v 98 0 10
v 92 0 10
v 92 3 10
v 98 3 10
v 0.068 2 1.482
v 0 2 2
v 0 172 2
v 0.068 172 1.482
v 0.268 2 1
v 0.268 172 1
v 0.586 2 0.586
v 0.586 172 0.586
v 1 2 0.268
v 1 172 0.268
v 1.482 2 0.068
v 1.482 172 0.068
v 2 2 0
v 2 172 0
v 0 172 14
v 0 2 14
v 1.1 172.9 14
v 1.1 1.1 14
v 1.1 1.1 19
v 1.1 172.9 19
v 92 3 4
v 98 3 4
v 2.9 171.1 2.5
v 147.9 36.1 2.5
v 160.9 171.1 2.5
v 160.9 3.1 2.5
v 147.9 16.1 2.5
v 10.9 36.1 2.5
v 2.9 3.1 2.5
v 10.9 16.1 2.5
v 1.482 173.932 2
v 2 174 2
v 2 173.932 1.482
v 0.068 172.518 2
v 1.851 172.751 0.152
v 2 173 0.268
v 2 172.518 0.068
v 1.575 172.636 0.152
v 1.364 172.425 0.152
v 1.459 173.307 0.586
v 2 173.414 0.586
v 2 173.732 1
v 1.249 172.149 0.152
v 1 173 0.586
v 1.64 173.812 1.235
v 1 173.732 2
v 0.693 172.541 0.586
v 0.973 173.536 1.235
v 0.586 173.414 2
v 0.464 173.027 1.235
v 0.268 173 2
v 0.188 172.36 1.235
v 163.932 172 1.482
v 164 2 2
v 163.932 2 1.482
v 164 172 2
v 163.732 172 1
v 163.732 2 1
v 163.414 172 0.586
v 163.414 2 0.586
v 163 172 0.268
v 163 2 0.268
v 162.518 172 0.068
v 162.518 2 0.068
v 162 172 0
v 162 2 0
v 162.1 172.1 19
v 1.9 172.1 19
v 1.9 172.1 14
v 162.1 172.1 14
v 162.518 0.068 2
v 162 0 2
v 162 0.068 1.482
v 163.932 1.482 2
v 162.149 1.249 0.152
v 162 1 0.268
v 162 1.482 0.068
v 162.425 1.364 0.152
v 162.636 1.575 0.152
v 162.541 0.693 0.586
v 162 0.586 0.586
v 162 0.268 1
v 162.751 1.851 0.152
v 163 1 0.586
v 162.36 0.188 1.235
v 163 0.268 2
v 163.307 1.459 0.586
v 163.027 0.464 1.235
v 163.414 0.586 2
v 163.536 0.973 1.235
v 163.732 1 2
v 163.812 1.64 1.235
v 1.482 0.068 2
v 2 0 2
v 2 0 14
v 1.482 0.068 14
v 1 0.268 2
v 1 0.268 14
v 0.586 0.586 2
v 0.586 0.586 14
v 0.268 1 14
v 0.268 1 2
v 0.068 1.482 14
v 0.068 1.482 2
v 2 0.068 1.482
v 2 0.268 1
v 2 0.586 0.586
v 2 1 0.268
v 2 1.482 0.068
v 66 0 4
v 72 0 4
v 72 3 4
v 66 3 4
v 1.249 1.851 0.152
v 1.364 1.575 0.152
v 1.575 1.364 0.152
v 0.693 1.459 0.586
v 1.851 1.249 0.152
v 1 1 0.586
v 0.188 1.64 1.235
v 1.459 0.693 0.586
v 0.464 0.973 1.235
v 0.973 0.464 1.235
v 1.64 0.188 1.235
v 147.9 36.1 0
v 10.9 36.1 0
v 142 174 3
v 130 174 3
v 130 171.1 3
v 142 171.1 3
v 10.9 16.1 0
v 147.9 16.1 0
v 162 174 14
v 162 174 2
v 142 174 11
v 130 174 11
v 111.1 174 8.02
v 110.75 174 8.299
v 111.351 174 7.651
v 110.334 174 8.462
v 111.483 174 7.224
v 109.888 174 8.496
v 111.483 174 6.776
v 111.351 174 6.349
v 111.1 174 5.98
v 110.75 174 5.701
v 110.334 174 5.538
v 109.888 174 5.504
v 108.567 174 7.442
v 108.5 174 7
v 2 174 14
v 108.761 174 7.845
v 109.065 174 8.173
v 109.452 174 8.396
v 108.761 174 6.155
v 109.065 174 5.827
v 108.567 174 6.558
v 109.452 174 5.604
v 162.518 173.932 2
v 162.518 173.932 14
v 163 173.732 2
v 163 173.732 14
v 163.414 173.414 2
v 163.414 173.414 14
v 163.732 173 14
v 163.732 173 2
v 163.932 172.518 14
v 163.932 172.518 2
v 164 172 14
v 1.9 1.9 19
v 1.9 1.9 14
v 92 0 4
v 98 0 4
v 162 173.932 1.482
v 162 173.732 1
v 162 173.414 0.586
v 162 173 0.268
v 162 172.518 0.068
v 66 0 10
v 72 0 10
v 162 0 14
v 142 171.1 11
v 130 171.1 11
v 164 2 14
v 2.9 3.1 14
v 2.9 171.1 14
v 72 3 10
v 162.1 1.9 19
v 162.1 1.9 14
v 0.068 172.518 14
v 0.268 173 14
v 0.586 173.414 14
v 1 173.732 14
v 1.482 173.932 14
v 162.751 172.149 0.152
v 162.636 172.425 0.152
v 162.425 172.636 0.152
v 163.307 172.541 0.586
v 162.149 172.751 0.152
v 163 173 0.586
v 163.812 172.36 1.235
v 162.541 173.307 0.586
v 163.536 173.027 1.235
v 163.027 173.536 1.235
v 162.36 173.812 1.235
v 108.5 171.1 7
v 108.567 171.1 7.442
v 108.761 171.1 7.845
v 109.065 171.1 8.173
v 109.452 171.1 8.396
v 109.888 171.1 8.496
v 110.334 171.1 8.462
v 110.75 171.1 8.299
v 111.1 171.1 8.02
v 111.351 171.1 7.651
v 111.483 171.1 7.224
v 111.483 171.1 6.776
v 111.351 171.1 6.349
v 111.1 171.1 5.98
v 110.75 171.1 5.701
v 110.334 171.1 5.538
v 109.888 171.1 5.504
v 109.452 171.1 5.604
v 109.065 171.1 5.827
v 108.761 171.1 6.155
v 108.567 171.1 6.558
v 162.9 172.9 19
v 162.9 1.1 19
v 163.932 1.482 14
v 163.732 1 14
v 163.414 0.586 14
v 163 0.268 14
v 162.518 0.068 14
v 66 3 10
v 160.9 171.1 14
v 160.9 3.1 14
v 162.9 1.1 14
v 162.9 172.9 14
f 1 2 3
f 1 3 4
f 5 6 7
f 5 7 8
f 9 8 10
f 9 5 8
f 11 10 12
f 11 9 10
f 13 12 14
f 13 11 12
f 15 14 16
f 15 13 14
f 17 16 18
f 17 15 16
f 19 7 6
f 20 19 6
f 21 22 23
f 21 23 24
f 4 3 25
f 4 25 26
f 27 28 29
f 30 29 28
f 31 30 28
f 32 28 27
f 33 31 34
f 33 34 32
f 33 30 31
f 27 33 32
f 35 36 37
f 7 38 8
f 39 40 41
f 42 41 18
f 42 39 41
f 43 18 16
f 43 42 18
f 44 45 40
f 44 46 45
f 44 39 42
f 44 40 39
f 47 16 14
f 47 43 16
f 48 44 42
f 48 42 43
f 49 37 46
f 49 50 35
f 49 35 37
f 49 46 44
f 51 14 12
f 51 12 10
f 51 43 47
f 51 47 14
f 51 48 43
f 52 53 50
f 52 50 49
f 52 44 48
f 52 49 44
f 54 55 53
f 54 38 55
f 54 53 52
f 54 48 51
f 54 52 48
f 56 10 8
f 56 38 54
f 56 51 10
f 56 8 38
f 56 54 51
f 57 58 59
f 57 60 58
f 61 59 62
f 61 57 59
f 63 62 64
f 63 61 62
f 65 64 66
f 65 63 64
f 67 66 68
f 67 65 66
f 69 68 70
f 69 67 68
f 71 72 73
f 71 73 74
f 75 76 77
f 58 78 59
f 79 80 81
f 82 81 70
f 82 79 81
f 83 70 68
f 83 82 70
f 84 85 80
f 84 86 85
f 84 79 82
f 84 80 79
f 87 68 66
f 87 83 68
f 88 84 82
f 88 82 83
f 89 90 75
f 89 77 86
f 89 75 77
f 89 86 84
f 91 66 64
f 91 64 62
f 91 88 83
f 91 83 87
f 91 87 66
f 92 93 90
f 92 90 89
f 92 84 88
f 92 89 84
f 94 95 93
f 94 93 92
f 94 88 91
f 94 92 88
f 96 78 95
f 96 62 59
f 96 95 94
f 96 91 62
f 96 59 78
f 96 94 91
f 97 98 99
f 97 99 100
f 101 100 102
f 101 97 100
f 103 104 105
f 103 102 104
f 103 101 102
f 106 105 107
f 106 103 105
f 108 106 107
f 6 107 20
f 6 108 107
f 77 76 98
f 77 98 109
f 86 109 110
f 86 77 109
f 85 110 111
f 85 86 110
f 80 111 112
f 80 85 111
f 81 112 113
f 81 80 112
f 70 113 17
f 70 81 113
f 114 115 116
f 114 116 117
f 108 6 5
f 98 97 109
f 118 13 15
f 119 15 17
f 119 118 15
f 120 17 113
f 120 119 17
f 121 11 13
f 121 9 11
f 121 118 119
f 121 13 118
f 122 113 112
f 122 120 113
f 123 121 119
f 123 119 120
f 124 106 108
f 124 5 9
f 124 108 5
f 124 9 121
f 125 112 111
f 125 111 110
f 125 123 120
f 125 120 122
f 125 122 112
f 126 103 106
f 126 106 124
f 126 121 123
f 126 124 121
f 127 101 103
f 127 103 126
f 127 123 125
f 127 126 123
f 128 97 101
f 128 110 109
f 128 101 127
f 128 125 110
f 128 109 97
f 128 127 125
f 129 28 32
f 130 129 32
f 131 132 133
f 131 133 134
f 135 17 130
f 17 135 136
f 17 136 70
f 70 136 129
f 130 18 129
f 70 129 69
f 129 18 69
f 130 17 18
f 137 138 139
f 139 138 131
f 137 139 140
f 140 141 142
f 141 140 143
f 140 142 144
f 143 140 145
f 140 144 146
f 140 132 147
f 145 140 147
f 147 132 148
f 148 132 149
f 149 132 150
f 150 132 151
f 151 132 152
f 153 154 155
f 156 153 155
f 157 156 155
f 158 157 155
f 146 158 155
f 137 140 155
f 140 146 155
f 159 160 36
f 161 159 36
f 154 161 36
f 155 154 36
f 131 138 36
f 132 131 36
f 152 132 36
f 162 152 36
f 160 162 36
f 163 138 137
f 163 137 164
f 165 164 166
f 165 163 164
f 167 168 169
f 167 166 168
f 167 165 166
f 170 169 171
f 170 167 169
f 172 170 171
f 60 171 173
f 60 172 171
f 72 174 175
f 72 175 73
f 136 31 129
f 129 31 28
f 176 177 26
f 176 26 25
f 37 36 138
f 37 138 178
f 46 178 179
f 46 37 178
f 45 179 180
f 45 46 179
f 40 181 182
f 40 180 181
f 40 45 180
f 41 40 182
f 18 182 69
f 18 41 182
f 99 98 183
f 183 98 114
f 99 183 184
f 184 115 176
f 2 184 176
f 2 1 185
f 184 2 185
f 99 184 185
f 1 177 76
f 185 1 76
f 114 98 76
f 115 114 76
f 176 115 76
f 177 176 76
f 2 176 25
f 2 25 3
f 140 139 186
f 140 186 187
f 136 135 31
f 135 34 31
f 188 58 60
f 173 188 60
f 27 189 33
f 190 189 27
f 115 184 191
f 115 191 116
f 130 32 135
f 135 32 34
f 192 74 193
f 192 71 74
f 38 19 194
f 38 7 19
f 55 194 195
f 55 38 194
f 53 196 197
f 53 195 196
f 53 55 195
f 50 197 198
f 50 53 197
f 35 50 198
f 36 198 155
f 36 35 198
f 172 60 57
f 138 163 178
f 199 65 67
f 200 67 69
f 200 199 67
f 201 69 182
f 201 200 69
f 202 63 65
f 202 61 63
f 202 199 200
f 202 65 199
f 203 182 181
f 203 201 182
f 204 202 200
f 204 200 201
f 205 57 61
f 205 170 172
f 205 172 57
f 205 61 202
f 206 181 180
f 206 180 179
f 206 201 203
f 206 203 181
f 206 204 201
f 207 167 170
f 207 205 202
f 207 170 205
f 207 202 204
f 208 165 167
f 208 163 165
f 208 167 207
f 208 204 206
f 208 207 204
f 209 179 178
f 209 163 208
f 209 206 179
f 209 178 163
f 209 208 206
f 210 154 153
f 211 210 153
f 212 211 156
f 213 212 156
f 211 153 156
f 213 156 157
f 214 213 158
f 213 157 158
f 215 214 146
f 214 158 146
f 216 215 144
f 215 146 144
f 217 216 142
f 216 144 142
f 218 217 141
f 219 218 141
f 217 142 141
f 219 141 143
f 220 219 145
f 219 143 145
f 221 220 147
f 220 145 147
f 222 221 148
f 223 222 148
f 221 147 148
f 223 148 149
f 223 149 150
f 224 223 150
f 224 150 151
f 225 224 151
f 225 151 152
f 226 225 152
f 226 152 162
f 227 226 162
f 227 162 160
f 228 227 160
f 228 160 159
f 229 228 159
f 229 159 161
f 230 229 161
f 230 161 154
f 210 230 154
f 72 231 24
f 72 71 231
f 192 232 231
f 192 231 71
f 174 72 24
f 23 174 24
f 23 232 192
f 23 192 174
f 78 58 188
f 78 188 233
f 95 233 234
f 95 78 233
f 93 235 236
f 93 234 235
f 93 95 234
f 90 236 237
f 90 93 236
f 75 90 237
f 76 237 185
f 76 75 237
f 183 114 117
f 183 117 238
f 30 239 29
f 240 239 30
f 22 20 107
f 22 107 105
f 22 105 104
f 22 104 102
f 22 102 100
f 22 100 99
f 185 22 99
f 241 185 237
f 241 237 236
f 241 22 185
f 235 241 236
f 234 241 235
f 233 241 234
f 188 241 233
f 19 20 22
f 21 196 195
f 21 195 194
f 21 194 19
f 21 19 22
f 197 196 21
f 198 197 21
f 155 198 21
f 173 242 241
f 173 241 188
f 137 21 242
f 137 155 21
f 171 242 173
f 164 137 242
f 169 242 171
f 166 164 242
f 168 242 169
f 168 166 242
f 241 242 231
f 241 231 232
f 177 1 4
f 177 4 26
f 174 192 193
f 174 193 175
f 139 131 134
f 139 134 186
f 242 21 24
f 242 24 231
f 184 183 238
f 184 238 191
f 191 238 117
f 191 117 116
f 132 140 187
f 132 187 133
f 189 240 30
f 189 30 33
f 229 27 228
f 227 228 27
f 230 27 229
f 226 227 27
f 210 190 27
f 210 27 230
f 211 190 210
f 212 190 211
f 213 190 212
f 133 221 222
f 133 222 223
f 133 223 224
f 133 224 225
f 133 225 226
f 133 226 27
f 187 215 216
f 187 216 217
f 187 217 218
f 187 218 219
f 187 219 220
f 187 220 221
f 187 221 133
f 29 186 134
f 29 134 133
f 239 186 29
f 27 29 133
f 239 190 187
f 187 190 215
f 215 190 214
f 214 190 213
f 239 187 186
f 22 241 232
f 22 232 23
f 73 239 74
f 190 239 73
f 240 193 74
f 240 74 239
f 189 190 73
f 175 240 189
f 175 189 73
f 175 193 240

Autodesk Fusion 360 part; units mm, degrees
sketch "Sketch1" plane through (0, 0, 0) normal (0, 0, 1) x (1, 0, 0)
  line L0 (2, 0) -> (162, 0)
  line L1 (164, 2) -> (164, 172)
  line L2 (162, 174) -> (2, 174)
  line L3 (0, 172) -> (0, 2)
  arc A0 (2, 174) -> (0, 172) centre (2, 172) ccw
  arc A1 (164, 172) -> (162, 174) centre (162, 172) ccw
  arc A2 (0, 2) -> (2, 0) centre (2, 2) ccw
  arc A3 (162, 0) -> (164, 2) centre (162, 2) ccw
  point P0 (164, 0)
  point P1 (0, 174)
  dimension "d1" = 164
  dimension "d2" = 174
  dimension "d3" = 2
  dimension "d4" = 2
  dimension "d5" = 2
  dimension "d6" = 2
extrude "Extrude1" add sketch "Sketch1" along normal blind 14
sketch "Sketch4" plane through (0, 0, 14) normal (0, 0, 1) x (-1, 0, 0)
  arc A0 (-162, 0) -> (-164, -2) centre (-162, -2) ccw
  line L0 (-164, -2) -> (-164, -172)
  arc A1 (-164, -172) -> (-162, -174) centre (-162, -172) ccw
  line L1 (-162, -174) -> (-2, -174)
  arc A2 (-2, -174) -> (0, -172) centre (-2, -172) ccw
  line L2 (0, -172) -> (0, -2)
  arc A3 (0, -2) -> (-2, 0) centre (-2, -2) ccw
  line L3 (-2, 0) -> (-162, 0)
  line L4 (-1.1, -172.9) -> (-162.9, -172.9)
  line L5 (-162.9, -172.9) -> (-162.9, -1.1)
  line L6 (-162.9, -1.1) -> (-1.1, -1.1)
  line L7 (-1.1, -1.1) -> (-1.1, -172.9)
  dimension "d19" = 161.8
  dimension "d20" = 171.8
  dimension "d21" = 1.1
  dimension "d22" = 1.1
extrude "Extrude4" add sketch "Sketch4" along normal blind 5 contours L4 L5 L6 L7
sketch "Sketch5" plane through (0, 0, 19) normal (0, 0, 1) x (-1, 0, 0)
  line L0 (-1.1, -1.1) -> (-162.9, -1.1)
  line L1 (-162.9, -1.1) -> (-162.9, -172.9)
  line L2 (-162.9, -172.9) -> (-1.1, -172.9)
  line L3 (-1.1, -172.9) -> (-1.1, -1.1)
  line L4 (-1.9, -172.1) -> (-162.1, -172.1)
  line L5 (-162.1, -172.1) -> (-162.1, -1.9)
  line L6 (-162.1, -1.9) -> (-1.9, -1.9)
  line L7 (-1.9, -1.9) -> (-1.9, -172.1)
  dimension "d25" = 160.2
  dimension "d26" = 170.2
  dimension "d27" = 0.8
  dimension "d28" = 0.8
extrude "Extrude5" cut sketch "Sketch5" against normal blind 5 contours L4 L5 L6 L7
sketch "Sketch6" plane through (0, 0, 14) normal (0, 0, 1) x (-1, 0, 0)
  line L0 (-1.9, -1.9) -> (-162.1, -1.9)
  line L1 (-162.1, -1.9) -> (-162.1, -172.1)
  line L2 (-162.1, -172.1) -> (-1.9, -172.1)
  line L3 (-1.9, -172.1) -> (-1.9, -1.9)
  line L4 (-2.9, -171.1) -> (-160.9, -171.1)
  line L5 (-160.9, -171.1) -> (-160.9, -3.1)
  line L6 (-160.9, -3.1) -> (-2.9, -3.1)
  line L7 (-2.9, -3.1) -> (-2.9, -171.1)
  dimension "d31" = 158
  dimension "d32" = 168
  dimension "d33" = 1
  dimension "d34" = 1
extrude "Extrude6" cut sketch "Sketch6" against normal blind 11.5 contours L4 L5 L6 L7
sketch "Sketch9" plane through (0, 0, 2.5) normal (0, 0, 1) x (-1, 0, 0)
  line L0 (-2.9, -3.1) -> (-160.9, -3.1)
  line L1 (-160.9, -3.1) -> (-160.9, -171.1)
  line L2 (-160.9, -171.1) -> (-2.9, -171.1)
  line L3 (-2.9, -171.1) -> (-2.9, -3.1)
  line L4 (-10.9, -16.1) -> (-147.9, -16.1)
  line L5 (-147.9, -16.1) -> (-147.9, -36.1)
  line L6 (-147.9, -36.1) -> (-10.9, -36.1)
  line L7 (-10.9, -36.1) -> (-10.9, -16.1)
  dimension "d37" = 137
  dimension "d38" = 20
  dimension "d39" = 13
  dimension "d40" = 8
extrude "Extrude7" cut sketch "Sketch9" against normal blind 2.5 contours L4 L5 L6 L7
sketch "Sketch10" plane through (0, 0, 0) normal (0, -1, 0) x (1, 0, 0)
  line L0 (2, 0) -> (162, 0)
  line L1 (162, 0) -> (162, 14)
  line L2 (162, 14) -> (2, 14)
  line L3 (2, 14) -> (2, 0)
  line L4 (66, 10) -> (72, 10)
  line L5 (72, 10) -> (72, 4)
  line L6 (72, 4) -> (66, 4)
  line L7 (66, 4) -> (66, 10)
  dimension "d43" = 6
  dimension "d44" = 6
  dimension "d45" = 4
  dimension "d46" = 64
sketch "Sketch11" plane through (0, 0, 0) normal (0, -1, 0) x (1, 0, 0)
  line L0 (92, 10) -> (98, 10)
  line L1 (98, 10) -> (98, 4)
  line L2 (98, 4) -> (92, 4)
  line L3 (92, 4) -> (92, 10)
  line L4 (162, 14) -> (2, 14)
  line L5 (162, 0) -> (162, 14)
  dimension "d47" = 6
  dimension "d48" = 6
  dimension "d49" = 4
  dimension "d50" = 64
extrude "Extrude8" cut sketch "Sketch10" against normal blind 3 contours L4 L5 L6 L7
extrude "Extrude9" cut sketch "Sketch11" against normal blind 3
sketch "Sketch12" plane through (0, 174, 0) normal (0, 1, 0) x (-1, 0, 0)
  line L0 (-162, 0) -> (-2, 0)
  line L1 (-2, 0) -> (-2, 14)
  line L2 (-2, 14) -> (-162, 14)
  line L3 (-162, 14) -> (-162, 0)
  line L4 (-142, 11) -> (-130, 11)
  line L5 (-130, 11) -> (-130, 3)
  line L6 (-130, 3) -> (-142, 3)
  line L7 (-142, 3) -> (-142, 11)
  dimension "d55" = 12
  dimension "d56" = 8
  dimension "d57" = 20
  dimension "d58" = 3
sketch "Sketch13" plane through (0, 174, 0) normal (0, 1, 0) x (-1, 0, 0)
  circle A0 centre (-110, 7) radius 1.5
  line L0 (-130, 11) -> (-130, 3)
  line L1 (-2, 14) -> (-162, 14)
  dimension "d59" = 3
  dimension "d60" = 20
  dimension "d61" = 7
extrude "Extrude10" cut sketch "Sketch12" against normal blind 3 contours L4 L5 L6 L7
extrude "Extrude11" cut sketch "Sketch13" against normal blind 3
fillet "Fillet1" radius 2 8 edges at (82, 174, 0) (0.5858, 173.4142, 0) (0, 87, 0) (0.5858, 0.5858, 0) (82, 0, 0) (163.4142, 0.5858, 0) (164, 87, 0) (163.4142, 173.4142, 0)
